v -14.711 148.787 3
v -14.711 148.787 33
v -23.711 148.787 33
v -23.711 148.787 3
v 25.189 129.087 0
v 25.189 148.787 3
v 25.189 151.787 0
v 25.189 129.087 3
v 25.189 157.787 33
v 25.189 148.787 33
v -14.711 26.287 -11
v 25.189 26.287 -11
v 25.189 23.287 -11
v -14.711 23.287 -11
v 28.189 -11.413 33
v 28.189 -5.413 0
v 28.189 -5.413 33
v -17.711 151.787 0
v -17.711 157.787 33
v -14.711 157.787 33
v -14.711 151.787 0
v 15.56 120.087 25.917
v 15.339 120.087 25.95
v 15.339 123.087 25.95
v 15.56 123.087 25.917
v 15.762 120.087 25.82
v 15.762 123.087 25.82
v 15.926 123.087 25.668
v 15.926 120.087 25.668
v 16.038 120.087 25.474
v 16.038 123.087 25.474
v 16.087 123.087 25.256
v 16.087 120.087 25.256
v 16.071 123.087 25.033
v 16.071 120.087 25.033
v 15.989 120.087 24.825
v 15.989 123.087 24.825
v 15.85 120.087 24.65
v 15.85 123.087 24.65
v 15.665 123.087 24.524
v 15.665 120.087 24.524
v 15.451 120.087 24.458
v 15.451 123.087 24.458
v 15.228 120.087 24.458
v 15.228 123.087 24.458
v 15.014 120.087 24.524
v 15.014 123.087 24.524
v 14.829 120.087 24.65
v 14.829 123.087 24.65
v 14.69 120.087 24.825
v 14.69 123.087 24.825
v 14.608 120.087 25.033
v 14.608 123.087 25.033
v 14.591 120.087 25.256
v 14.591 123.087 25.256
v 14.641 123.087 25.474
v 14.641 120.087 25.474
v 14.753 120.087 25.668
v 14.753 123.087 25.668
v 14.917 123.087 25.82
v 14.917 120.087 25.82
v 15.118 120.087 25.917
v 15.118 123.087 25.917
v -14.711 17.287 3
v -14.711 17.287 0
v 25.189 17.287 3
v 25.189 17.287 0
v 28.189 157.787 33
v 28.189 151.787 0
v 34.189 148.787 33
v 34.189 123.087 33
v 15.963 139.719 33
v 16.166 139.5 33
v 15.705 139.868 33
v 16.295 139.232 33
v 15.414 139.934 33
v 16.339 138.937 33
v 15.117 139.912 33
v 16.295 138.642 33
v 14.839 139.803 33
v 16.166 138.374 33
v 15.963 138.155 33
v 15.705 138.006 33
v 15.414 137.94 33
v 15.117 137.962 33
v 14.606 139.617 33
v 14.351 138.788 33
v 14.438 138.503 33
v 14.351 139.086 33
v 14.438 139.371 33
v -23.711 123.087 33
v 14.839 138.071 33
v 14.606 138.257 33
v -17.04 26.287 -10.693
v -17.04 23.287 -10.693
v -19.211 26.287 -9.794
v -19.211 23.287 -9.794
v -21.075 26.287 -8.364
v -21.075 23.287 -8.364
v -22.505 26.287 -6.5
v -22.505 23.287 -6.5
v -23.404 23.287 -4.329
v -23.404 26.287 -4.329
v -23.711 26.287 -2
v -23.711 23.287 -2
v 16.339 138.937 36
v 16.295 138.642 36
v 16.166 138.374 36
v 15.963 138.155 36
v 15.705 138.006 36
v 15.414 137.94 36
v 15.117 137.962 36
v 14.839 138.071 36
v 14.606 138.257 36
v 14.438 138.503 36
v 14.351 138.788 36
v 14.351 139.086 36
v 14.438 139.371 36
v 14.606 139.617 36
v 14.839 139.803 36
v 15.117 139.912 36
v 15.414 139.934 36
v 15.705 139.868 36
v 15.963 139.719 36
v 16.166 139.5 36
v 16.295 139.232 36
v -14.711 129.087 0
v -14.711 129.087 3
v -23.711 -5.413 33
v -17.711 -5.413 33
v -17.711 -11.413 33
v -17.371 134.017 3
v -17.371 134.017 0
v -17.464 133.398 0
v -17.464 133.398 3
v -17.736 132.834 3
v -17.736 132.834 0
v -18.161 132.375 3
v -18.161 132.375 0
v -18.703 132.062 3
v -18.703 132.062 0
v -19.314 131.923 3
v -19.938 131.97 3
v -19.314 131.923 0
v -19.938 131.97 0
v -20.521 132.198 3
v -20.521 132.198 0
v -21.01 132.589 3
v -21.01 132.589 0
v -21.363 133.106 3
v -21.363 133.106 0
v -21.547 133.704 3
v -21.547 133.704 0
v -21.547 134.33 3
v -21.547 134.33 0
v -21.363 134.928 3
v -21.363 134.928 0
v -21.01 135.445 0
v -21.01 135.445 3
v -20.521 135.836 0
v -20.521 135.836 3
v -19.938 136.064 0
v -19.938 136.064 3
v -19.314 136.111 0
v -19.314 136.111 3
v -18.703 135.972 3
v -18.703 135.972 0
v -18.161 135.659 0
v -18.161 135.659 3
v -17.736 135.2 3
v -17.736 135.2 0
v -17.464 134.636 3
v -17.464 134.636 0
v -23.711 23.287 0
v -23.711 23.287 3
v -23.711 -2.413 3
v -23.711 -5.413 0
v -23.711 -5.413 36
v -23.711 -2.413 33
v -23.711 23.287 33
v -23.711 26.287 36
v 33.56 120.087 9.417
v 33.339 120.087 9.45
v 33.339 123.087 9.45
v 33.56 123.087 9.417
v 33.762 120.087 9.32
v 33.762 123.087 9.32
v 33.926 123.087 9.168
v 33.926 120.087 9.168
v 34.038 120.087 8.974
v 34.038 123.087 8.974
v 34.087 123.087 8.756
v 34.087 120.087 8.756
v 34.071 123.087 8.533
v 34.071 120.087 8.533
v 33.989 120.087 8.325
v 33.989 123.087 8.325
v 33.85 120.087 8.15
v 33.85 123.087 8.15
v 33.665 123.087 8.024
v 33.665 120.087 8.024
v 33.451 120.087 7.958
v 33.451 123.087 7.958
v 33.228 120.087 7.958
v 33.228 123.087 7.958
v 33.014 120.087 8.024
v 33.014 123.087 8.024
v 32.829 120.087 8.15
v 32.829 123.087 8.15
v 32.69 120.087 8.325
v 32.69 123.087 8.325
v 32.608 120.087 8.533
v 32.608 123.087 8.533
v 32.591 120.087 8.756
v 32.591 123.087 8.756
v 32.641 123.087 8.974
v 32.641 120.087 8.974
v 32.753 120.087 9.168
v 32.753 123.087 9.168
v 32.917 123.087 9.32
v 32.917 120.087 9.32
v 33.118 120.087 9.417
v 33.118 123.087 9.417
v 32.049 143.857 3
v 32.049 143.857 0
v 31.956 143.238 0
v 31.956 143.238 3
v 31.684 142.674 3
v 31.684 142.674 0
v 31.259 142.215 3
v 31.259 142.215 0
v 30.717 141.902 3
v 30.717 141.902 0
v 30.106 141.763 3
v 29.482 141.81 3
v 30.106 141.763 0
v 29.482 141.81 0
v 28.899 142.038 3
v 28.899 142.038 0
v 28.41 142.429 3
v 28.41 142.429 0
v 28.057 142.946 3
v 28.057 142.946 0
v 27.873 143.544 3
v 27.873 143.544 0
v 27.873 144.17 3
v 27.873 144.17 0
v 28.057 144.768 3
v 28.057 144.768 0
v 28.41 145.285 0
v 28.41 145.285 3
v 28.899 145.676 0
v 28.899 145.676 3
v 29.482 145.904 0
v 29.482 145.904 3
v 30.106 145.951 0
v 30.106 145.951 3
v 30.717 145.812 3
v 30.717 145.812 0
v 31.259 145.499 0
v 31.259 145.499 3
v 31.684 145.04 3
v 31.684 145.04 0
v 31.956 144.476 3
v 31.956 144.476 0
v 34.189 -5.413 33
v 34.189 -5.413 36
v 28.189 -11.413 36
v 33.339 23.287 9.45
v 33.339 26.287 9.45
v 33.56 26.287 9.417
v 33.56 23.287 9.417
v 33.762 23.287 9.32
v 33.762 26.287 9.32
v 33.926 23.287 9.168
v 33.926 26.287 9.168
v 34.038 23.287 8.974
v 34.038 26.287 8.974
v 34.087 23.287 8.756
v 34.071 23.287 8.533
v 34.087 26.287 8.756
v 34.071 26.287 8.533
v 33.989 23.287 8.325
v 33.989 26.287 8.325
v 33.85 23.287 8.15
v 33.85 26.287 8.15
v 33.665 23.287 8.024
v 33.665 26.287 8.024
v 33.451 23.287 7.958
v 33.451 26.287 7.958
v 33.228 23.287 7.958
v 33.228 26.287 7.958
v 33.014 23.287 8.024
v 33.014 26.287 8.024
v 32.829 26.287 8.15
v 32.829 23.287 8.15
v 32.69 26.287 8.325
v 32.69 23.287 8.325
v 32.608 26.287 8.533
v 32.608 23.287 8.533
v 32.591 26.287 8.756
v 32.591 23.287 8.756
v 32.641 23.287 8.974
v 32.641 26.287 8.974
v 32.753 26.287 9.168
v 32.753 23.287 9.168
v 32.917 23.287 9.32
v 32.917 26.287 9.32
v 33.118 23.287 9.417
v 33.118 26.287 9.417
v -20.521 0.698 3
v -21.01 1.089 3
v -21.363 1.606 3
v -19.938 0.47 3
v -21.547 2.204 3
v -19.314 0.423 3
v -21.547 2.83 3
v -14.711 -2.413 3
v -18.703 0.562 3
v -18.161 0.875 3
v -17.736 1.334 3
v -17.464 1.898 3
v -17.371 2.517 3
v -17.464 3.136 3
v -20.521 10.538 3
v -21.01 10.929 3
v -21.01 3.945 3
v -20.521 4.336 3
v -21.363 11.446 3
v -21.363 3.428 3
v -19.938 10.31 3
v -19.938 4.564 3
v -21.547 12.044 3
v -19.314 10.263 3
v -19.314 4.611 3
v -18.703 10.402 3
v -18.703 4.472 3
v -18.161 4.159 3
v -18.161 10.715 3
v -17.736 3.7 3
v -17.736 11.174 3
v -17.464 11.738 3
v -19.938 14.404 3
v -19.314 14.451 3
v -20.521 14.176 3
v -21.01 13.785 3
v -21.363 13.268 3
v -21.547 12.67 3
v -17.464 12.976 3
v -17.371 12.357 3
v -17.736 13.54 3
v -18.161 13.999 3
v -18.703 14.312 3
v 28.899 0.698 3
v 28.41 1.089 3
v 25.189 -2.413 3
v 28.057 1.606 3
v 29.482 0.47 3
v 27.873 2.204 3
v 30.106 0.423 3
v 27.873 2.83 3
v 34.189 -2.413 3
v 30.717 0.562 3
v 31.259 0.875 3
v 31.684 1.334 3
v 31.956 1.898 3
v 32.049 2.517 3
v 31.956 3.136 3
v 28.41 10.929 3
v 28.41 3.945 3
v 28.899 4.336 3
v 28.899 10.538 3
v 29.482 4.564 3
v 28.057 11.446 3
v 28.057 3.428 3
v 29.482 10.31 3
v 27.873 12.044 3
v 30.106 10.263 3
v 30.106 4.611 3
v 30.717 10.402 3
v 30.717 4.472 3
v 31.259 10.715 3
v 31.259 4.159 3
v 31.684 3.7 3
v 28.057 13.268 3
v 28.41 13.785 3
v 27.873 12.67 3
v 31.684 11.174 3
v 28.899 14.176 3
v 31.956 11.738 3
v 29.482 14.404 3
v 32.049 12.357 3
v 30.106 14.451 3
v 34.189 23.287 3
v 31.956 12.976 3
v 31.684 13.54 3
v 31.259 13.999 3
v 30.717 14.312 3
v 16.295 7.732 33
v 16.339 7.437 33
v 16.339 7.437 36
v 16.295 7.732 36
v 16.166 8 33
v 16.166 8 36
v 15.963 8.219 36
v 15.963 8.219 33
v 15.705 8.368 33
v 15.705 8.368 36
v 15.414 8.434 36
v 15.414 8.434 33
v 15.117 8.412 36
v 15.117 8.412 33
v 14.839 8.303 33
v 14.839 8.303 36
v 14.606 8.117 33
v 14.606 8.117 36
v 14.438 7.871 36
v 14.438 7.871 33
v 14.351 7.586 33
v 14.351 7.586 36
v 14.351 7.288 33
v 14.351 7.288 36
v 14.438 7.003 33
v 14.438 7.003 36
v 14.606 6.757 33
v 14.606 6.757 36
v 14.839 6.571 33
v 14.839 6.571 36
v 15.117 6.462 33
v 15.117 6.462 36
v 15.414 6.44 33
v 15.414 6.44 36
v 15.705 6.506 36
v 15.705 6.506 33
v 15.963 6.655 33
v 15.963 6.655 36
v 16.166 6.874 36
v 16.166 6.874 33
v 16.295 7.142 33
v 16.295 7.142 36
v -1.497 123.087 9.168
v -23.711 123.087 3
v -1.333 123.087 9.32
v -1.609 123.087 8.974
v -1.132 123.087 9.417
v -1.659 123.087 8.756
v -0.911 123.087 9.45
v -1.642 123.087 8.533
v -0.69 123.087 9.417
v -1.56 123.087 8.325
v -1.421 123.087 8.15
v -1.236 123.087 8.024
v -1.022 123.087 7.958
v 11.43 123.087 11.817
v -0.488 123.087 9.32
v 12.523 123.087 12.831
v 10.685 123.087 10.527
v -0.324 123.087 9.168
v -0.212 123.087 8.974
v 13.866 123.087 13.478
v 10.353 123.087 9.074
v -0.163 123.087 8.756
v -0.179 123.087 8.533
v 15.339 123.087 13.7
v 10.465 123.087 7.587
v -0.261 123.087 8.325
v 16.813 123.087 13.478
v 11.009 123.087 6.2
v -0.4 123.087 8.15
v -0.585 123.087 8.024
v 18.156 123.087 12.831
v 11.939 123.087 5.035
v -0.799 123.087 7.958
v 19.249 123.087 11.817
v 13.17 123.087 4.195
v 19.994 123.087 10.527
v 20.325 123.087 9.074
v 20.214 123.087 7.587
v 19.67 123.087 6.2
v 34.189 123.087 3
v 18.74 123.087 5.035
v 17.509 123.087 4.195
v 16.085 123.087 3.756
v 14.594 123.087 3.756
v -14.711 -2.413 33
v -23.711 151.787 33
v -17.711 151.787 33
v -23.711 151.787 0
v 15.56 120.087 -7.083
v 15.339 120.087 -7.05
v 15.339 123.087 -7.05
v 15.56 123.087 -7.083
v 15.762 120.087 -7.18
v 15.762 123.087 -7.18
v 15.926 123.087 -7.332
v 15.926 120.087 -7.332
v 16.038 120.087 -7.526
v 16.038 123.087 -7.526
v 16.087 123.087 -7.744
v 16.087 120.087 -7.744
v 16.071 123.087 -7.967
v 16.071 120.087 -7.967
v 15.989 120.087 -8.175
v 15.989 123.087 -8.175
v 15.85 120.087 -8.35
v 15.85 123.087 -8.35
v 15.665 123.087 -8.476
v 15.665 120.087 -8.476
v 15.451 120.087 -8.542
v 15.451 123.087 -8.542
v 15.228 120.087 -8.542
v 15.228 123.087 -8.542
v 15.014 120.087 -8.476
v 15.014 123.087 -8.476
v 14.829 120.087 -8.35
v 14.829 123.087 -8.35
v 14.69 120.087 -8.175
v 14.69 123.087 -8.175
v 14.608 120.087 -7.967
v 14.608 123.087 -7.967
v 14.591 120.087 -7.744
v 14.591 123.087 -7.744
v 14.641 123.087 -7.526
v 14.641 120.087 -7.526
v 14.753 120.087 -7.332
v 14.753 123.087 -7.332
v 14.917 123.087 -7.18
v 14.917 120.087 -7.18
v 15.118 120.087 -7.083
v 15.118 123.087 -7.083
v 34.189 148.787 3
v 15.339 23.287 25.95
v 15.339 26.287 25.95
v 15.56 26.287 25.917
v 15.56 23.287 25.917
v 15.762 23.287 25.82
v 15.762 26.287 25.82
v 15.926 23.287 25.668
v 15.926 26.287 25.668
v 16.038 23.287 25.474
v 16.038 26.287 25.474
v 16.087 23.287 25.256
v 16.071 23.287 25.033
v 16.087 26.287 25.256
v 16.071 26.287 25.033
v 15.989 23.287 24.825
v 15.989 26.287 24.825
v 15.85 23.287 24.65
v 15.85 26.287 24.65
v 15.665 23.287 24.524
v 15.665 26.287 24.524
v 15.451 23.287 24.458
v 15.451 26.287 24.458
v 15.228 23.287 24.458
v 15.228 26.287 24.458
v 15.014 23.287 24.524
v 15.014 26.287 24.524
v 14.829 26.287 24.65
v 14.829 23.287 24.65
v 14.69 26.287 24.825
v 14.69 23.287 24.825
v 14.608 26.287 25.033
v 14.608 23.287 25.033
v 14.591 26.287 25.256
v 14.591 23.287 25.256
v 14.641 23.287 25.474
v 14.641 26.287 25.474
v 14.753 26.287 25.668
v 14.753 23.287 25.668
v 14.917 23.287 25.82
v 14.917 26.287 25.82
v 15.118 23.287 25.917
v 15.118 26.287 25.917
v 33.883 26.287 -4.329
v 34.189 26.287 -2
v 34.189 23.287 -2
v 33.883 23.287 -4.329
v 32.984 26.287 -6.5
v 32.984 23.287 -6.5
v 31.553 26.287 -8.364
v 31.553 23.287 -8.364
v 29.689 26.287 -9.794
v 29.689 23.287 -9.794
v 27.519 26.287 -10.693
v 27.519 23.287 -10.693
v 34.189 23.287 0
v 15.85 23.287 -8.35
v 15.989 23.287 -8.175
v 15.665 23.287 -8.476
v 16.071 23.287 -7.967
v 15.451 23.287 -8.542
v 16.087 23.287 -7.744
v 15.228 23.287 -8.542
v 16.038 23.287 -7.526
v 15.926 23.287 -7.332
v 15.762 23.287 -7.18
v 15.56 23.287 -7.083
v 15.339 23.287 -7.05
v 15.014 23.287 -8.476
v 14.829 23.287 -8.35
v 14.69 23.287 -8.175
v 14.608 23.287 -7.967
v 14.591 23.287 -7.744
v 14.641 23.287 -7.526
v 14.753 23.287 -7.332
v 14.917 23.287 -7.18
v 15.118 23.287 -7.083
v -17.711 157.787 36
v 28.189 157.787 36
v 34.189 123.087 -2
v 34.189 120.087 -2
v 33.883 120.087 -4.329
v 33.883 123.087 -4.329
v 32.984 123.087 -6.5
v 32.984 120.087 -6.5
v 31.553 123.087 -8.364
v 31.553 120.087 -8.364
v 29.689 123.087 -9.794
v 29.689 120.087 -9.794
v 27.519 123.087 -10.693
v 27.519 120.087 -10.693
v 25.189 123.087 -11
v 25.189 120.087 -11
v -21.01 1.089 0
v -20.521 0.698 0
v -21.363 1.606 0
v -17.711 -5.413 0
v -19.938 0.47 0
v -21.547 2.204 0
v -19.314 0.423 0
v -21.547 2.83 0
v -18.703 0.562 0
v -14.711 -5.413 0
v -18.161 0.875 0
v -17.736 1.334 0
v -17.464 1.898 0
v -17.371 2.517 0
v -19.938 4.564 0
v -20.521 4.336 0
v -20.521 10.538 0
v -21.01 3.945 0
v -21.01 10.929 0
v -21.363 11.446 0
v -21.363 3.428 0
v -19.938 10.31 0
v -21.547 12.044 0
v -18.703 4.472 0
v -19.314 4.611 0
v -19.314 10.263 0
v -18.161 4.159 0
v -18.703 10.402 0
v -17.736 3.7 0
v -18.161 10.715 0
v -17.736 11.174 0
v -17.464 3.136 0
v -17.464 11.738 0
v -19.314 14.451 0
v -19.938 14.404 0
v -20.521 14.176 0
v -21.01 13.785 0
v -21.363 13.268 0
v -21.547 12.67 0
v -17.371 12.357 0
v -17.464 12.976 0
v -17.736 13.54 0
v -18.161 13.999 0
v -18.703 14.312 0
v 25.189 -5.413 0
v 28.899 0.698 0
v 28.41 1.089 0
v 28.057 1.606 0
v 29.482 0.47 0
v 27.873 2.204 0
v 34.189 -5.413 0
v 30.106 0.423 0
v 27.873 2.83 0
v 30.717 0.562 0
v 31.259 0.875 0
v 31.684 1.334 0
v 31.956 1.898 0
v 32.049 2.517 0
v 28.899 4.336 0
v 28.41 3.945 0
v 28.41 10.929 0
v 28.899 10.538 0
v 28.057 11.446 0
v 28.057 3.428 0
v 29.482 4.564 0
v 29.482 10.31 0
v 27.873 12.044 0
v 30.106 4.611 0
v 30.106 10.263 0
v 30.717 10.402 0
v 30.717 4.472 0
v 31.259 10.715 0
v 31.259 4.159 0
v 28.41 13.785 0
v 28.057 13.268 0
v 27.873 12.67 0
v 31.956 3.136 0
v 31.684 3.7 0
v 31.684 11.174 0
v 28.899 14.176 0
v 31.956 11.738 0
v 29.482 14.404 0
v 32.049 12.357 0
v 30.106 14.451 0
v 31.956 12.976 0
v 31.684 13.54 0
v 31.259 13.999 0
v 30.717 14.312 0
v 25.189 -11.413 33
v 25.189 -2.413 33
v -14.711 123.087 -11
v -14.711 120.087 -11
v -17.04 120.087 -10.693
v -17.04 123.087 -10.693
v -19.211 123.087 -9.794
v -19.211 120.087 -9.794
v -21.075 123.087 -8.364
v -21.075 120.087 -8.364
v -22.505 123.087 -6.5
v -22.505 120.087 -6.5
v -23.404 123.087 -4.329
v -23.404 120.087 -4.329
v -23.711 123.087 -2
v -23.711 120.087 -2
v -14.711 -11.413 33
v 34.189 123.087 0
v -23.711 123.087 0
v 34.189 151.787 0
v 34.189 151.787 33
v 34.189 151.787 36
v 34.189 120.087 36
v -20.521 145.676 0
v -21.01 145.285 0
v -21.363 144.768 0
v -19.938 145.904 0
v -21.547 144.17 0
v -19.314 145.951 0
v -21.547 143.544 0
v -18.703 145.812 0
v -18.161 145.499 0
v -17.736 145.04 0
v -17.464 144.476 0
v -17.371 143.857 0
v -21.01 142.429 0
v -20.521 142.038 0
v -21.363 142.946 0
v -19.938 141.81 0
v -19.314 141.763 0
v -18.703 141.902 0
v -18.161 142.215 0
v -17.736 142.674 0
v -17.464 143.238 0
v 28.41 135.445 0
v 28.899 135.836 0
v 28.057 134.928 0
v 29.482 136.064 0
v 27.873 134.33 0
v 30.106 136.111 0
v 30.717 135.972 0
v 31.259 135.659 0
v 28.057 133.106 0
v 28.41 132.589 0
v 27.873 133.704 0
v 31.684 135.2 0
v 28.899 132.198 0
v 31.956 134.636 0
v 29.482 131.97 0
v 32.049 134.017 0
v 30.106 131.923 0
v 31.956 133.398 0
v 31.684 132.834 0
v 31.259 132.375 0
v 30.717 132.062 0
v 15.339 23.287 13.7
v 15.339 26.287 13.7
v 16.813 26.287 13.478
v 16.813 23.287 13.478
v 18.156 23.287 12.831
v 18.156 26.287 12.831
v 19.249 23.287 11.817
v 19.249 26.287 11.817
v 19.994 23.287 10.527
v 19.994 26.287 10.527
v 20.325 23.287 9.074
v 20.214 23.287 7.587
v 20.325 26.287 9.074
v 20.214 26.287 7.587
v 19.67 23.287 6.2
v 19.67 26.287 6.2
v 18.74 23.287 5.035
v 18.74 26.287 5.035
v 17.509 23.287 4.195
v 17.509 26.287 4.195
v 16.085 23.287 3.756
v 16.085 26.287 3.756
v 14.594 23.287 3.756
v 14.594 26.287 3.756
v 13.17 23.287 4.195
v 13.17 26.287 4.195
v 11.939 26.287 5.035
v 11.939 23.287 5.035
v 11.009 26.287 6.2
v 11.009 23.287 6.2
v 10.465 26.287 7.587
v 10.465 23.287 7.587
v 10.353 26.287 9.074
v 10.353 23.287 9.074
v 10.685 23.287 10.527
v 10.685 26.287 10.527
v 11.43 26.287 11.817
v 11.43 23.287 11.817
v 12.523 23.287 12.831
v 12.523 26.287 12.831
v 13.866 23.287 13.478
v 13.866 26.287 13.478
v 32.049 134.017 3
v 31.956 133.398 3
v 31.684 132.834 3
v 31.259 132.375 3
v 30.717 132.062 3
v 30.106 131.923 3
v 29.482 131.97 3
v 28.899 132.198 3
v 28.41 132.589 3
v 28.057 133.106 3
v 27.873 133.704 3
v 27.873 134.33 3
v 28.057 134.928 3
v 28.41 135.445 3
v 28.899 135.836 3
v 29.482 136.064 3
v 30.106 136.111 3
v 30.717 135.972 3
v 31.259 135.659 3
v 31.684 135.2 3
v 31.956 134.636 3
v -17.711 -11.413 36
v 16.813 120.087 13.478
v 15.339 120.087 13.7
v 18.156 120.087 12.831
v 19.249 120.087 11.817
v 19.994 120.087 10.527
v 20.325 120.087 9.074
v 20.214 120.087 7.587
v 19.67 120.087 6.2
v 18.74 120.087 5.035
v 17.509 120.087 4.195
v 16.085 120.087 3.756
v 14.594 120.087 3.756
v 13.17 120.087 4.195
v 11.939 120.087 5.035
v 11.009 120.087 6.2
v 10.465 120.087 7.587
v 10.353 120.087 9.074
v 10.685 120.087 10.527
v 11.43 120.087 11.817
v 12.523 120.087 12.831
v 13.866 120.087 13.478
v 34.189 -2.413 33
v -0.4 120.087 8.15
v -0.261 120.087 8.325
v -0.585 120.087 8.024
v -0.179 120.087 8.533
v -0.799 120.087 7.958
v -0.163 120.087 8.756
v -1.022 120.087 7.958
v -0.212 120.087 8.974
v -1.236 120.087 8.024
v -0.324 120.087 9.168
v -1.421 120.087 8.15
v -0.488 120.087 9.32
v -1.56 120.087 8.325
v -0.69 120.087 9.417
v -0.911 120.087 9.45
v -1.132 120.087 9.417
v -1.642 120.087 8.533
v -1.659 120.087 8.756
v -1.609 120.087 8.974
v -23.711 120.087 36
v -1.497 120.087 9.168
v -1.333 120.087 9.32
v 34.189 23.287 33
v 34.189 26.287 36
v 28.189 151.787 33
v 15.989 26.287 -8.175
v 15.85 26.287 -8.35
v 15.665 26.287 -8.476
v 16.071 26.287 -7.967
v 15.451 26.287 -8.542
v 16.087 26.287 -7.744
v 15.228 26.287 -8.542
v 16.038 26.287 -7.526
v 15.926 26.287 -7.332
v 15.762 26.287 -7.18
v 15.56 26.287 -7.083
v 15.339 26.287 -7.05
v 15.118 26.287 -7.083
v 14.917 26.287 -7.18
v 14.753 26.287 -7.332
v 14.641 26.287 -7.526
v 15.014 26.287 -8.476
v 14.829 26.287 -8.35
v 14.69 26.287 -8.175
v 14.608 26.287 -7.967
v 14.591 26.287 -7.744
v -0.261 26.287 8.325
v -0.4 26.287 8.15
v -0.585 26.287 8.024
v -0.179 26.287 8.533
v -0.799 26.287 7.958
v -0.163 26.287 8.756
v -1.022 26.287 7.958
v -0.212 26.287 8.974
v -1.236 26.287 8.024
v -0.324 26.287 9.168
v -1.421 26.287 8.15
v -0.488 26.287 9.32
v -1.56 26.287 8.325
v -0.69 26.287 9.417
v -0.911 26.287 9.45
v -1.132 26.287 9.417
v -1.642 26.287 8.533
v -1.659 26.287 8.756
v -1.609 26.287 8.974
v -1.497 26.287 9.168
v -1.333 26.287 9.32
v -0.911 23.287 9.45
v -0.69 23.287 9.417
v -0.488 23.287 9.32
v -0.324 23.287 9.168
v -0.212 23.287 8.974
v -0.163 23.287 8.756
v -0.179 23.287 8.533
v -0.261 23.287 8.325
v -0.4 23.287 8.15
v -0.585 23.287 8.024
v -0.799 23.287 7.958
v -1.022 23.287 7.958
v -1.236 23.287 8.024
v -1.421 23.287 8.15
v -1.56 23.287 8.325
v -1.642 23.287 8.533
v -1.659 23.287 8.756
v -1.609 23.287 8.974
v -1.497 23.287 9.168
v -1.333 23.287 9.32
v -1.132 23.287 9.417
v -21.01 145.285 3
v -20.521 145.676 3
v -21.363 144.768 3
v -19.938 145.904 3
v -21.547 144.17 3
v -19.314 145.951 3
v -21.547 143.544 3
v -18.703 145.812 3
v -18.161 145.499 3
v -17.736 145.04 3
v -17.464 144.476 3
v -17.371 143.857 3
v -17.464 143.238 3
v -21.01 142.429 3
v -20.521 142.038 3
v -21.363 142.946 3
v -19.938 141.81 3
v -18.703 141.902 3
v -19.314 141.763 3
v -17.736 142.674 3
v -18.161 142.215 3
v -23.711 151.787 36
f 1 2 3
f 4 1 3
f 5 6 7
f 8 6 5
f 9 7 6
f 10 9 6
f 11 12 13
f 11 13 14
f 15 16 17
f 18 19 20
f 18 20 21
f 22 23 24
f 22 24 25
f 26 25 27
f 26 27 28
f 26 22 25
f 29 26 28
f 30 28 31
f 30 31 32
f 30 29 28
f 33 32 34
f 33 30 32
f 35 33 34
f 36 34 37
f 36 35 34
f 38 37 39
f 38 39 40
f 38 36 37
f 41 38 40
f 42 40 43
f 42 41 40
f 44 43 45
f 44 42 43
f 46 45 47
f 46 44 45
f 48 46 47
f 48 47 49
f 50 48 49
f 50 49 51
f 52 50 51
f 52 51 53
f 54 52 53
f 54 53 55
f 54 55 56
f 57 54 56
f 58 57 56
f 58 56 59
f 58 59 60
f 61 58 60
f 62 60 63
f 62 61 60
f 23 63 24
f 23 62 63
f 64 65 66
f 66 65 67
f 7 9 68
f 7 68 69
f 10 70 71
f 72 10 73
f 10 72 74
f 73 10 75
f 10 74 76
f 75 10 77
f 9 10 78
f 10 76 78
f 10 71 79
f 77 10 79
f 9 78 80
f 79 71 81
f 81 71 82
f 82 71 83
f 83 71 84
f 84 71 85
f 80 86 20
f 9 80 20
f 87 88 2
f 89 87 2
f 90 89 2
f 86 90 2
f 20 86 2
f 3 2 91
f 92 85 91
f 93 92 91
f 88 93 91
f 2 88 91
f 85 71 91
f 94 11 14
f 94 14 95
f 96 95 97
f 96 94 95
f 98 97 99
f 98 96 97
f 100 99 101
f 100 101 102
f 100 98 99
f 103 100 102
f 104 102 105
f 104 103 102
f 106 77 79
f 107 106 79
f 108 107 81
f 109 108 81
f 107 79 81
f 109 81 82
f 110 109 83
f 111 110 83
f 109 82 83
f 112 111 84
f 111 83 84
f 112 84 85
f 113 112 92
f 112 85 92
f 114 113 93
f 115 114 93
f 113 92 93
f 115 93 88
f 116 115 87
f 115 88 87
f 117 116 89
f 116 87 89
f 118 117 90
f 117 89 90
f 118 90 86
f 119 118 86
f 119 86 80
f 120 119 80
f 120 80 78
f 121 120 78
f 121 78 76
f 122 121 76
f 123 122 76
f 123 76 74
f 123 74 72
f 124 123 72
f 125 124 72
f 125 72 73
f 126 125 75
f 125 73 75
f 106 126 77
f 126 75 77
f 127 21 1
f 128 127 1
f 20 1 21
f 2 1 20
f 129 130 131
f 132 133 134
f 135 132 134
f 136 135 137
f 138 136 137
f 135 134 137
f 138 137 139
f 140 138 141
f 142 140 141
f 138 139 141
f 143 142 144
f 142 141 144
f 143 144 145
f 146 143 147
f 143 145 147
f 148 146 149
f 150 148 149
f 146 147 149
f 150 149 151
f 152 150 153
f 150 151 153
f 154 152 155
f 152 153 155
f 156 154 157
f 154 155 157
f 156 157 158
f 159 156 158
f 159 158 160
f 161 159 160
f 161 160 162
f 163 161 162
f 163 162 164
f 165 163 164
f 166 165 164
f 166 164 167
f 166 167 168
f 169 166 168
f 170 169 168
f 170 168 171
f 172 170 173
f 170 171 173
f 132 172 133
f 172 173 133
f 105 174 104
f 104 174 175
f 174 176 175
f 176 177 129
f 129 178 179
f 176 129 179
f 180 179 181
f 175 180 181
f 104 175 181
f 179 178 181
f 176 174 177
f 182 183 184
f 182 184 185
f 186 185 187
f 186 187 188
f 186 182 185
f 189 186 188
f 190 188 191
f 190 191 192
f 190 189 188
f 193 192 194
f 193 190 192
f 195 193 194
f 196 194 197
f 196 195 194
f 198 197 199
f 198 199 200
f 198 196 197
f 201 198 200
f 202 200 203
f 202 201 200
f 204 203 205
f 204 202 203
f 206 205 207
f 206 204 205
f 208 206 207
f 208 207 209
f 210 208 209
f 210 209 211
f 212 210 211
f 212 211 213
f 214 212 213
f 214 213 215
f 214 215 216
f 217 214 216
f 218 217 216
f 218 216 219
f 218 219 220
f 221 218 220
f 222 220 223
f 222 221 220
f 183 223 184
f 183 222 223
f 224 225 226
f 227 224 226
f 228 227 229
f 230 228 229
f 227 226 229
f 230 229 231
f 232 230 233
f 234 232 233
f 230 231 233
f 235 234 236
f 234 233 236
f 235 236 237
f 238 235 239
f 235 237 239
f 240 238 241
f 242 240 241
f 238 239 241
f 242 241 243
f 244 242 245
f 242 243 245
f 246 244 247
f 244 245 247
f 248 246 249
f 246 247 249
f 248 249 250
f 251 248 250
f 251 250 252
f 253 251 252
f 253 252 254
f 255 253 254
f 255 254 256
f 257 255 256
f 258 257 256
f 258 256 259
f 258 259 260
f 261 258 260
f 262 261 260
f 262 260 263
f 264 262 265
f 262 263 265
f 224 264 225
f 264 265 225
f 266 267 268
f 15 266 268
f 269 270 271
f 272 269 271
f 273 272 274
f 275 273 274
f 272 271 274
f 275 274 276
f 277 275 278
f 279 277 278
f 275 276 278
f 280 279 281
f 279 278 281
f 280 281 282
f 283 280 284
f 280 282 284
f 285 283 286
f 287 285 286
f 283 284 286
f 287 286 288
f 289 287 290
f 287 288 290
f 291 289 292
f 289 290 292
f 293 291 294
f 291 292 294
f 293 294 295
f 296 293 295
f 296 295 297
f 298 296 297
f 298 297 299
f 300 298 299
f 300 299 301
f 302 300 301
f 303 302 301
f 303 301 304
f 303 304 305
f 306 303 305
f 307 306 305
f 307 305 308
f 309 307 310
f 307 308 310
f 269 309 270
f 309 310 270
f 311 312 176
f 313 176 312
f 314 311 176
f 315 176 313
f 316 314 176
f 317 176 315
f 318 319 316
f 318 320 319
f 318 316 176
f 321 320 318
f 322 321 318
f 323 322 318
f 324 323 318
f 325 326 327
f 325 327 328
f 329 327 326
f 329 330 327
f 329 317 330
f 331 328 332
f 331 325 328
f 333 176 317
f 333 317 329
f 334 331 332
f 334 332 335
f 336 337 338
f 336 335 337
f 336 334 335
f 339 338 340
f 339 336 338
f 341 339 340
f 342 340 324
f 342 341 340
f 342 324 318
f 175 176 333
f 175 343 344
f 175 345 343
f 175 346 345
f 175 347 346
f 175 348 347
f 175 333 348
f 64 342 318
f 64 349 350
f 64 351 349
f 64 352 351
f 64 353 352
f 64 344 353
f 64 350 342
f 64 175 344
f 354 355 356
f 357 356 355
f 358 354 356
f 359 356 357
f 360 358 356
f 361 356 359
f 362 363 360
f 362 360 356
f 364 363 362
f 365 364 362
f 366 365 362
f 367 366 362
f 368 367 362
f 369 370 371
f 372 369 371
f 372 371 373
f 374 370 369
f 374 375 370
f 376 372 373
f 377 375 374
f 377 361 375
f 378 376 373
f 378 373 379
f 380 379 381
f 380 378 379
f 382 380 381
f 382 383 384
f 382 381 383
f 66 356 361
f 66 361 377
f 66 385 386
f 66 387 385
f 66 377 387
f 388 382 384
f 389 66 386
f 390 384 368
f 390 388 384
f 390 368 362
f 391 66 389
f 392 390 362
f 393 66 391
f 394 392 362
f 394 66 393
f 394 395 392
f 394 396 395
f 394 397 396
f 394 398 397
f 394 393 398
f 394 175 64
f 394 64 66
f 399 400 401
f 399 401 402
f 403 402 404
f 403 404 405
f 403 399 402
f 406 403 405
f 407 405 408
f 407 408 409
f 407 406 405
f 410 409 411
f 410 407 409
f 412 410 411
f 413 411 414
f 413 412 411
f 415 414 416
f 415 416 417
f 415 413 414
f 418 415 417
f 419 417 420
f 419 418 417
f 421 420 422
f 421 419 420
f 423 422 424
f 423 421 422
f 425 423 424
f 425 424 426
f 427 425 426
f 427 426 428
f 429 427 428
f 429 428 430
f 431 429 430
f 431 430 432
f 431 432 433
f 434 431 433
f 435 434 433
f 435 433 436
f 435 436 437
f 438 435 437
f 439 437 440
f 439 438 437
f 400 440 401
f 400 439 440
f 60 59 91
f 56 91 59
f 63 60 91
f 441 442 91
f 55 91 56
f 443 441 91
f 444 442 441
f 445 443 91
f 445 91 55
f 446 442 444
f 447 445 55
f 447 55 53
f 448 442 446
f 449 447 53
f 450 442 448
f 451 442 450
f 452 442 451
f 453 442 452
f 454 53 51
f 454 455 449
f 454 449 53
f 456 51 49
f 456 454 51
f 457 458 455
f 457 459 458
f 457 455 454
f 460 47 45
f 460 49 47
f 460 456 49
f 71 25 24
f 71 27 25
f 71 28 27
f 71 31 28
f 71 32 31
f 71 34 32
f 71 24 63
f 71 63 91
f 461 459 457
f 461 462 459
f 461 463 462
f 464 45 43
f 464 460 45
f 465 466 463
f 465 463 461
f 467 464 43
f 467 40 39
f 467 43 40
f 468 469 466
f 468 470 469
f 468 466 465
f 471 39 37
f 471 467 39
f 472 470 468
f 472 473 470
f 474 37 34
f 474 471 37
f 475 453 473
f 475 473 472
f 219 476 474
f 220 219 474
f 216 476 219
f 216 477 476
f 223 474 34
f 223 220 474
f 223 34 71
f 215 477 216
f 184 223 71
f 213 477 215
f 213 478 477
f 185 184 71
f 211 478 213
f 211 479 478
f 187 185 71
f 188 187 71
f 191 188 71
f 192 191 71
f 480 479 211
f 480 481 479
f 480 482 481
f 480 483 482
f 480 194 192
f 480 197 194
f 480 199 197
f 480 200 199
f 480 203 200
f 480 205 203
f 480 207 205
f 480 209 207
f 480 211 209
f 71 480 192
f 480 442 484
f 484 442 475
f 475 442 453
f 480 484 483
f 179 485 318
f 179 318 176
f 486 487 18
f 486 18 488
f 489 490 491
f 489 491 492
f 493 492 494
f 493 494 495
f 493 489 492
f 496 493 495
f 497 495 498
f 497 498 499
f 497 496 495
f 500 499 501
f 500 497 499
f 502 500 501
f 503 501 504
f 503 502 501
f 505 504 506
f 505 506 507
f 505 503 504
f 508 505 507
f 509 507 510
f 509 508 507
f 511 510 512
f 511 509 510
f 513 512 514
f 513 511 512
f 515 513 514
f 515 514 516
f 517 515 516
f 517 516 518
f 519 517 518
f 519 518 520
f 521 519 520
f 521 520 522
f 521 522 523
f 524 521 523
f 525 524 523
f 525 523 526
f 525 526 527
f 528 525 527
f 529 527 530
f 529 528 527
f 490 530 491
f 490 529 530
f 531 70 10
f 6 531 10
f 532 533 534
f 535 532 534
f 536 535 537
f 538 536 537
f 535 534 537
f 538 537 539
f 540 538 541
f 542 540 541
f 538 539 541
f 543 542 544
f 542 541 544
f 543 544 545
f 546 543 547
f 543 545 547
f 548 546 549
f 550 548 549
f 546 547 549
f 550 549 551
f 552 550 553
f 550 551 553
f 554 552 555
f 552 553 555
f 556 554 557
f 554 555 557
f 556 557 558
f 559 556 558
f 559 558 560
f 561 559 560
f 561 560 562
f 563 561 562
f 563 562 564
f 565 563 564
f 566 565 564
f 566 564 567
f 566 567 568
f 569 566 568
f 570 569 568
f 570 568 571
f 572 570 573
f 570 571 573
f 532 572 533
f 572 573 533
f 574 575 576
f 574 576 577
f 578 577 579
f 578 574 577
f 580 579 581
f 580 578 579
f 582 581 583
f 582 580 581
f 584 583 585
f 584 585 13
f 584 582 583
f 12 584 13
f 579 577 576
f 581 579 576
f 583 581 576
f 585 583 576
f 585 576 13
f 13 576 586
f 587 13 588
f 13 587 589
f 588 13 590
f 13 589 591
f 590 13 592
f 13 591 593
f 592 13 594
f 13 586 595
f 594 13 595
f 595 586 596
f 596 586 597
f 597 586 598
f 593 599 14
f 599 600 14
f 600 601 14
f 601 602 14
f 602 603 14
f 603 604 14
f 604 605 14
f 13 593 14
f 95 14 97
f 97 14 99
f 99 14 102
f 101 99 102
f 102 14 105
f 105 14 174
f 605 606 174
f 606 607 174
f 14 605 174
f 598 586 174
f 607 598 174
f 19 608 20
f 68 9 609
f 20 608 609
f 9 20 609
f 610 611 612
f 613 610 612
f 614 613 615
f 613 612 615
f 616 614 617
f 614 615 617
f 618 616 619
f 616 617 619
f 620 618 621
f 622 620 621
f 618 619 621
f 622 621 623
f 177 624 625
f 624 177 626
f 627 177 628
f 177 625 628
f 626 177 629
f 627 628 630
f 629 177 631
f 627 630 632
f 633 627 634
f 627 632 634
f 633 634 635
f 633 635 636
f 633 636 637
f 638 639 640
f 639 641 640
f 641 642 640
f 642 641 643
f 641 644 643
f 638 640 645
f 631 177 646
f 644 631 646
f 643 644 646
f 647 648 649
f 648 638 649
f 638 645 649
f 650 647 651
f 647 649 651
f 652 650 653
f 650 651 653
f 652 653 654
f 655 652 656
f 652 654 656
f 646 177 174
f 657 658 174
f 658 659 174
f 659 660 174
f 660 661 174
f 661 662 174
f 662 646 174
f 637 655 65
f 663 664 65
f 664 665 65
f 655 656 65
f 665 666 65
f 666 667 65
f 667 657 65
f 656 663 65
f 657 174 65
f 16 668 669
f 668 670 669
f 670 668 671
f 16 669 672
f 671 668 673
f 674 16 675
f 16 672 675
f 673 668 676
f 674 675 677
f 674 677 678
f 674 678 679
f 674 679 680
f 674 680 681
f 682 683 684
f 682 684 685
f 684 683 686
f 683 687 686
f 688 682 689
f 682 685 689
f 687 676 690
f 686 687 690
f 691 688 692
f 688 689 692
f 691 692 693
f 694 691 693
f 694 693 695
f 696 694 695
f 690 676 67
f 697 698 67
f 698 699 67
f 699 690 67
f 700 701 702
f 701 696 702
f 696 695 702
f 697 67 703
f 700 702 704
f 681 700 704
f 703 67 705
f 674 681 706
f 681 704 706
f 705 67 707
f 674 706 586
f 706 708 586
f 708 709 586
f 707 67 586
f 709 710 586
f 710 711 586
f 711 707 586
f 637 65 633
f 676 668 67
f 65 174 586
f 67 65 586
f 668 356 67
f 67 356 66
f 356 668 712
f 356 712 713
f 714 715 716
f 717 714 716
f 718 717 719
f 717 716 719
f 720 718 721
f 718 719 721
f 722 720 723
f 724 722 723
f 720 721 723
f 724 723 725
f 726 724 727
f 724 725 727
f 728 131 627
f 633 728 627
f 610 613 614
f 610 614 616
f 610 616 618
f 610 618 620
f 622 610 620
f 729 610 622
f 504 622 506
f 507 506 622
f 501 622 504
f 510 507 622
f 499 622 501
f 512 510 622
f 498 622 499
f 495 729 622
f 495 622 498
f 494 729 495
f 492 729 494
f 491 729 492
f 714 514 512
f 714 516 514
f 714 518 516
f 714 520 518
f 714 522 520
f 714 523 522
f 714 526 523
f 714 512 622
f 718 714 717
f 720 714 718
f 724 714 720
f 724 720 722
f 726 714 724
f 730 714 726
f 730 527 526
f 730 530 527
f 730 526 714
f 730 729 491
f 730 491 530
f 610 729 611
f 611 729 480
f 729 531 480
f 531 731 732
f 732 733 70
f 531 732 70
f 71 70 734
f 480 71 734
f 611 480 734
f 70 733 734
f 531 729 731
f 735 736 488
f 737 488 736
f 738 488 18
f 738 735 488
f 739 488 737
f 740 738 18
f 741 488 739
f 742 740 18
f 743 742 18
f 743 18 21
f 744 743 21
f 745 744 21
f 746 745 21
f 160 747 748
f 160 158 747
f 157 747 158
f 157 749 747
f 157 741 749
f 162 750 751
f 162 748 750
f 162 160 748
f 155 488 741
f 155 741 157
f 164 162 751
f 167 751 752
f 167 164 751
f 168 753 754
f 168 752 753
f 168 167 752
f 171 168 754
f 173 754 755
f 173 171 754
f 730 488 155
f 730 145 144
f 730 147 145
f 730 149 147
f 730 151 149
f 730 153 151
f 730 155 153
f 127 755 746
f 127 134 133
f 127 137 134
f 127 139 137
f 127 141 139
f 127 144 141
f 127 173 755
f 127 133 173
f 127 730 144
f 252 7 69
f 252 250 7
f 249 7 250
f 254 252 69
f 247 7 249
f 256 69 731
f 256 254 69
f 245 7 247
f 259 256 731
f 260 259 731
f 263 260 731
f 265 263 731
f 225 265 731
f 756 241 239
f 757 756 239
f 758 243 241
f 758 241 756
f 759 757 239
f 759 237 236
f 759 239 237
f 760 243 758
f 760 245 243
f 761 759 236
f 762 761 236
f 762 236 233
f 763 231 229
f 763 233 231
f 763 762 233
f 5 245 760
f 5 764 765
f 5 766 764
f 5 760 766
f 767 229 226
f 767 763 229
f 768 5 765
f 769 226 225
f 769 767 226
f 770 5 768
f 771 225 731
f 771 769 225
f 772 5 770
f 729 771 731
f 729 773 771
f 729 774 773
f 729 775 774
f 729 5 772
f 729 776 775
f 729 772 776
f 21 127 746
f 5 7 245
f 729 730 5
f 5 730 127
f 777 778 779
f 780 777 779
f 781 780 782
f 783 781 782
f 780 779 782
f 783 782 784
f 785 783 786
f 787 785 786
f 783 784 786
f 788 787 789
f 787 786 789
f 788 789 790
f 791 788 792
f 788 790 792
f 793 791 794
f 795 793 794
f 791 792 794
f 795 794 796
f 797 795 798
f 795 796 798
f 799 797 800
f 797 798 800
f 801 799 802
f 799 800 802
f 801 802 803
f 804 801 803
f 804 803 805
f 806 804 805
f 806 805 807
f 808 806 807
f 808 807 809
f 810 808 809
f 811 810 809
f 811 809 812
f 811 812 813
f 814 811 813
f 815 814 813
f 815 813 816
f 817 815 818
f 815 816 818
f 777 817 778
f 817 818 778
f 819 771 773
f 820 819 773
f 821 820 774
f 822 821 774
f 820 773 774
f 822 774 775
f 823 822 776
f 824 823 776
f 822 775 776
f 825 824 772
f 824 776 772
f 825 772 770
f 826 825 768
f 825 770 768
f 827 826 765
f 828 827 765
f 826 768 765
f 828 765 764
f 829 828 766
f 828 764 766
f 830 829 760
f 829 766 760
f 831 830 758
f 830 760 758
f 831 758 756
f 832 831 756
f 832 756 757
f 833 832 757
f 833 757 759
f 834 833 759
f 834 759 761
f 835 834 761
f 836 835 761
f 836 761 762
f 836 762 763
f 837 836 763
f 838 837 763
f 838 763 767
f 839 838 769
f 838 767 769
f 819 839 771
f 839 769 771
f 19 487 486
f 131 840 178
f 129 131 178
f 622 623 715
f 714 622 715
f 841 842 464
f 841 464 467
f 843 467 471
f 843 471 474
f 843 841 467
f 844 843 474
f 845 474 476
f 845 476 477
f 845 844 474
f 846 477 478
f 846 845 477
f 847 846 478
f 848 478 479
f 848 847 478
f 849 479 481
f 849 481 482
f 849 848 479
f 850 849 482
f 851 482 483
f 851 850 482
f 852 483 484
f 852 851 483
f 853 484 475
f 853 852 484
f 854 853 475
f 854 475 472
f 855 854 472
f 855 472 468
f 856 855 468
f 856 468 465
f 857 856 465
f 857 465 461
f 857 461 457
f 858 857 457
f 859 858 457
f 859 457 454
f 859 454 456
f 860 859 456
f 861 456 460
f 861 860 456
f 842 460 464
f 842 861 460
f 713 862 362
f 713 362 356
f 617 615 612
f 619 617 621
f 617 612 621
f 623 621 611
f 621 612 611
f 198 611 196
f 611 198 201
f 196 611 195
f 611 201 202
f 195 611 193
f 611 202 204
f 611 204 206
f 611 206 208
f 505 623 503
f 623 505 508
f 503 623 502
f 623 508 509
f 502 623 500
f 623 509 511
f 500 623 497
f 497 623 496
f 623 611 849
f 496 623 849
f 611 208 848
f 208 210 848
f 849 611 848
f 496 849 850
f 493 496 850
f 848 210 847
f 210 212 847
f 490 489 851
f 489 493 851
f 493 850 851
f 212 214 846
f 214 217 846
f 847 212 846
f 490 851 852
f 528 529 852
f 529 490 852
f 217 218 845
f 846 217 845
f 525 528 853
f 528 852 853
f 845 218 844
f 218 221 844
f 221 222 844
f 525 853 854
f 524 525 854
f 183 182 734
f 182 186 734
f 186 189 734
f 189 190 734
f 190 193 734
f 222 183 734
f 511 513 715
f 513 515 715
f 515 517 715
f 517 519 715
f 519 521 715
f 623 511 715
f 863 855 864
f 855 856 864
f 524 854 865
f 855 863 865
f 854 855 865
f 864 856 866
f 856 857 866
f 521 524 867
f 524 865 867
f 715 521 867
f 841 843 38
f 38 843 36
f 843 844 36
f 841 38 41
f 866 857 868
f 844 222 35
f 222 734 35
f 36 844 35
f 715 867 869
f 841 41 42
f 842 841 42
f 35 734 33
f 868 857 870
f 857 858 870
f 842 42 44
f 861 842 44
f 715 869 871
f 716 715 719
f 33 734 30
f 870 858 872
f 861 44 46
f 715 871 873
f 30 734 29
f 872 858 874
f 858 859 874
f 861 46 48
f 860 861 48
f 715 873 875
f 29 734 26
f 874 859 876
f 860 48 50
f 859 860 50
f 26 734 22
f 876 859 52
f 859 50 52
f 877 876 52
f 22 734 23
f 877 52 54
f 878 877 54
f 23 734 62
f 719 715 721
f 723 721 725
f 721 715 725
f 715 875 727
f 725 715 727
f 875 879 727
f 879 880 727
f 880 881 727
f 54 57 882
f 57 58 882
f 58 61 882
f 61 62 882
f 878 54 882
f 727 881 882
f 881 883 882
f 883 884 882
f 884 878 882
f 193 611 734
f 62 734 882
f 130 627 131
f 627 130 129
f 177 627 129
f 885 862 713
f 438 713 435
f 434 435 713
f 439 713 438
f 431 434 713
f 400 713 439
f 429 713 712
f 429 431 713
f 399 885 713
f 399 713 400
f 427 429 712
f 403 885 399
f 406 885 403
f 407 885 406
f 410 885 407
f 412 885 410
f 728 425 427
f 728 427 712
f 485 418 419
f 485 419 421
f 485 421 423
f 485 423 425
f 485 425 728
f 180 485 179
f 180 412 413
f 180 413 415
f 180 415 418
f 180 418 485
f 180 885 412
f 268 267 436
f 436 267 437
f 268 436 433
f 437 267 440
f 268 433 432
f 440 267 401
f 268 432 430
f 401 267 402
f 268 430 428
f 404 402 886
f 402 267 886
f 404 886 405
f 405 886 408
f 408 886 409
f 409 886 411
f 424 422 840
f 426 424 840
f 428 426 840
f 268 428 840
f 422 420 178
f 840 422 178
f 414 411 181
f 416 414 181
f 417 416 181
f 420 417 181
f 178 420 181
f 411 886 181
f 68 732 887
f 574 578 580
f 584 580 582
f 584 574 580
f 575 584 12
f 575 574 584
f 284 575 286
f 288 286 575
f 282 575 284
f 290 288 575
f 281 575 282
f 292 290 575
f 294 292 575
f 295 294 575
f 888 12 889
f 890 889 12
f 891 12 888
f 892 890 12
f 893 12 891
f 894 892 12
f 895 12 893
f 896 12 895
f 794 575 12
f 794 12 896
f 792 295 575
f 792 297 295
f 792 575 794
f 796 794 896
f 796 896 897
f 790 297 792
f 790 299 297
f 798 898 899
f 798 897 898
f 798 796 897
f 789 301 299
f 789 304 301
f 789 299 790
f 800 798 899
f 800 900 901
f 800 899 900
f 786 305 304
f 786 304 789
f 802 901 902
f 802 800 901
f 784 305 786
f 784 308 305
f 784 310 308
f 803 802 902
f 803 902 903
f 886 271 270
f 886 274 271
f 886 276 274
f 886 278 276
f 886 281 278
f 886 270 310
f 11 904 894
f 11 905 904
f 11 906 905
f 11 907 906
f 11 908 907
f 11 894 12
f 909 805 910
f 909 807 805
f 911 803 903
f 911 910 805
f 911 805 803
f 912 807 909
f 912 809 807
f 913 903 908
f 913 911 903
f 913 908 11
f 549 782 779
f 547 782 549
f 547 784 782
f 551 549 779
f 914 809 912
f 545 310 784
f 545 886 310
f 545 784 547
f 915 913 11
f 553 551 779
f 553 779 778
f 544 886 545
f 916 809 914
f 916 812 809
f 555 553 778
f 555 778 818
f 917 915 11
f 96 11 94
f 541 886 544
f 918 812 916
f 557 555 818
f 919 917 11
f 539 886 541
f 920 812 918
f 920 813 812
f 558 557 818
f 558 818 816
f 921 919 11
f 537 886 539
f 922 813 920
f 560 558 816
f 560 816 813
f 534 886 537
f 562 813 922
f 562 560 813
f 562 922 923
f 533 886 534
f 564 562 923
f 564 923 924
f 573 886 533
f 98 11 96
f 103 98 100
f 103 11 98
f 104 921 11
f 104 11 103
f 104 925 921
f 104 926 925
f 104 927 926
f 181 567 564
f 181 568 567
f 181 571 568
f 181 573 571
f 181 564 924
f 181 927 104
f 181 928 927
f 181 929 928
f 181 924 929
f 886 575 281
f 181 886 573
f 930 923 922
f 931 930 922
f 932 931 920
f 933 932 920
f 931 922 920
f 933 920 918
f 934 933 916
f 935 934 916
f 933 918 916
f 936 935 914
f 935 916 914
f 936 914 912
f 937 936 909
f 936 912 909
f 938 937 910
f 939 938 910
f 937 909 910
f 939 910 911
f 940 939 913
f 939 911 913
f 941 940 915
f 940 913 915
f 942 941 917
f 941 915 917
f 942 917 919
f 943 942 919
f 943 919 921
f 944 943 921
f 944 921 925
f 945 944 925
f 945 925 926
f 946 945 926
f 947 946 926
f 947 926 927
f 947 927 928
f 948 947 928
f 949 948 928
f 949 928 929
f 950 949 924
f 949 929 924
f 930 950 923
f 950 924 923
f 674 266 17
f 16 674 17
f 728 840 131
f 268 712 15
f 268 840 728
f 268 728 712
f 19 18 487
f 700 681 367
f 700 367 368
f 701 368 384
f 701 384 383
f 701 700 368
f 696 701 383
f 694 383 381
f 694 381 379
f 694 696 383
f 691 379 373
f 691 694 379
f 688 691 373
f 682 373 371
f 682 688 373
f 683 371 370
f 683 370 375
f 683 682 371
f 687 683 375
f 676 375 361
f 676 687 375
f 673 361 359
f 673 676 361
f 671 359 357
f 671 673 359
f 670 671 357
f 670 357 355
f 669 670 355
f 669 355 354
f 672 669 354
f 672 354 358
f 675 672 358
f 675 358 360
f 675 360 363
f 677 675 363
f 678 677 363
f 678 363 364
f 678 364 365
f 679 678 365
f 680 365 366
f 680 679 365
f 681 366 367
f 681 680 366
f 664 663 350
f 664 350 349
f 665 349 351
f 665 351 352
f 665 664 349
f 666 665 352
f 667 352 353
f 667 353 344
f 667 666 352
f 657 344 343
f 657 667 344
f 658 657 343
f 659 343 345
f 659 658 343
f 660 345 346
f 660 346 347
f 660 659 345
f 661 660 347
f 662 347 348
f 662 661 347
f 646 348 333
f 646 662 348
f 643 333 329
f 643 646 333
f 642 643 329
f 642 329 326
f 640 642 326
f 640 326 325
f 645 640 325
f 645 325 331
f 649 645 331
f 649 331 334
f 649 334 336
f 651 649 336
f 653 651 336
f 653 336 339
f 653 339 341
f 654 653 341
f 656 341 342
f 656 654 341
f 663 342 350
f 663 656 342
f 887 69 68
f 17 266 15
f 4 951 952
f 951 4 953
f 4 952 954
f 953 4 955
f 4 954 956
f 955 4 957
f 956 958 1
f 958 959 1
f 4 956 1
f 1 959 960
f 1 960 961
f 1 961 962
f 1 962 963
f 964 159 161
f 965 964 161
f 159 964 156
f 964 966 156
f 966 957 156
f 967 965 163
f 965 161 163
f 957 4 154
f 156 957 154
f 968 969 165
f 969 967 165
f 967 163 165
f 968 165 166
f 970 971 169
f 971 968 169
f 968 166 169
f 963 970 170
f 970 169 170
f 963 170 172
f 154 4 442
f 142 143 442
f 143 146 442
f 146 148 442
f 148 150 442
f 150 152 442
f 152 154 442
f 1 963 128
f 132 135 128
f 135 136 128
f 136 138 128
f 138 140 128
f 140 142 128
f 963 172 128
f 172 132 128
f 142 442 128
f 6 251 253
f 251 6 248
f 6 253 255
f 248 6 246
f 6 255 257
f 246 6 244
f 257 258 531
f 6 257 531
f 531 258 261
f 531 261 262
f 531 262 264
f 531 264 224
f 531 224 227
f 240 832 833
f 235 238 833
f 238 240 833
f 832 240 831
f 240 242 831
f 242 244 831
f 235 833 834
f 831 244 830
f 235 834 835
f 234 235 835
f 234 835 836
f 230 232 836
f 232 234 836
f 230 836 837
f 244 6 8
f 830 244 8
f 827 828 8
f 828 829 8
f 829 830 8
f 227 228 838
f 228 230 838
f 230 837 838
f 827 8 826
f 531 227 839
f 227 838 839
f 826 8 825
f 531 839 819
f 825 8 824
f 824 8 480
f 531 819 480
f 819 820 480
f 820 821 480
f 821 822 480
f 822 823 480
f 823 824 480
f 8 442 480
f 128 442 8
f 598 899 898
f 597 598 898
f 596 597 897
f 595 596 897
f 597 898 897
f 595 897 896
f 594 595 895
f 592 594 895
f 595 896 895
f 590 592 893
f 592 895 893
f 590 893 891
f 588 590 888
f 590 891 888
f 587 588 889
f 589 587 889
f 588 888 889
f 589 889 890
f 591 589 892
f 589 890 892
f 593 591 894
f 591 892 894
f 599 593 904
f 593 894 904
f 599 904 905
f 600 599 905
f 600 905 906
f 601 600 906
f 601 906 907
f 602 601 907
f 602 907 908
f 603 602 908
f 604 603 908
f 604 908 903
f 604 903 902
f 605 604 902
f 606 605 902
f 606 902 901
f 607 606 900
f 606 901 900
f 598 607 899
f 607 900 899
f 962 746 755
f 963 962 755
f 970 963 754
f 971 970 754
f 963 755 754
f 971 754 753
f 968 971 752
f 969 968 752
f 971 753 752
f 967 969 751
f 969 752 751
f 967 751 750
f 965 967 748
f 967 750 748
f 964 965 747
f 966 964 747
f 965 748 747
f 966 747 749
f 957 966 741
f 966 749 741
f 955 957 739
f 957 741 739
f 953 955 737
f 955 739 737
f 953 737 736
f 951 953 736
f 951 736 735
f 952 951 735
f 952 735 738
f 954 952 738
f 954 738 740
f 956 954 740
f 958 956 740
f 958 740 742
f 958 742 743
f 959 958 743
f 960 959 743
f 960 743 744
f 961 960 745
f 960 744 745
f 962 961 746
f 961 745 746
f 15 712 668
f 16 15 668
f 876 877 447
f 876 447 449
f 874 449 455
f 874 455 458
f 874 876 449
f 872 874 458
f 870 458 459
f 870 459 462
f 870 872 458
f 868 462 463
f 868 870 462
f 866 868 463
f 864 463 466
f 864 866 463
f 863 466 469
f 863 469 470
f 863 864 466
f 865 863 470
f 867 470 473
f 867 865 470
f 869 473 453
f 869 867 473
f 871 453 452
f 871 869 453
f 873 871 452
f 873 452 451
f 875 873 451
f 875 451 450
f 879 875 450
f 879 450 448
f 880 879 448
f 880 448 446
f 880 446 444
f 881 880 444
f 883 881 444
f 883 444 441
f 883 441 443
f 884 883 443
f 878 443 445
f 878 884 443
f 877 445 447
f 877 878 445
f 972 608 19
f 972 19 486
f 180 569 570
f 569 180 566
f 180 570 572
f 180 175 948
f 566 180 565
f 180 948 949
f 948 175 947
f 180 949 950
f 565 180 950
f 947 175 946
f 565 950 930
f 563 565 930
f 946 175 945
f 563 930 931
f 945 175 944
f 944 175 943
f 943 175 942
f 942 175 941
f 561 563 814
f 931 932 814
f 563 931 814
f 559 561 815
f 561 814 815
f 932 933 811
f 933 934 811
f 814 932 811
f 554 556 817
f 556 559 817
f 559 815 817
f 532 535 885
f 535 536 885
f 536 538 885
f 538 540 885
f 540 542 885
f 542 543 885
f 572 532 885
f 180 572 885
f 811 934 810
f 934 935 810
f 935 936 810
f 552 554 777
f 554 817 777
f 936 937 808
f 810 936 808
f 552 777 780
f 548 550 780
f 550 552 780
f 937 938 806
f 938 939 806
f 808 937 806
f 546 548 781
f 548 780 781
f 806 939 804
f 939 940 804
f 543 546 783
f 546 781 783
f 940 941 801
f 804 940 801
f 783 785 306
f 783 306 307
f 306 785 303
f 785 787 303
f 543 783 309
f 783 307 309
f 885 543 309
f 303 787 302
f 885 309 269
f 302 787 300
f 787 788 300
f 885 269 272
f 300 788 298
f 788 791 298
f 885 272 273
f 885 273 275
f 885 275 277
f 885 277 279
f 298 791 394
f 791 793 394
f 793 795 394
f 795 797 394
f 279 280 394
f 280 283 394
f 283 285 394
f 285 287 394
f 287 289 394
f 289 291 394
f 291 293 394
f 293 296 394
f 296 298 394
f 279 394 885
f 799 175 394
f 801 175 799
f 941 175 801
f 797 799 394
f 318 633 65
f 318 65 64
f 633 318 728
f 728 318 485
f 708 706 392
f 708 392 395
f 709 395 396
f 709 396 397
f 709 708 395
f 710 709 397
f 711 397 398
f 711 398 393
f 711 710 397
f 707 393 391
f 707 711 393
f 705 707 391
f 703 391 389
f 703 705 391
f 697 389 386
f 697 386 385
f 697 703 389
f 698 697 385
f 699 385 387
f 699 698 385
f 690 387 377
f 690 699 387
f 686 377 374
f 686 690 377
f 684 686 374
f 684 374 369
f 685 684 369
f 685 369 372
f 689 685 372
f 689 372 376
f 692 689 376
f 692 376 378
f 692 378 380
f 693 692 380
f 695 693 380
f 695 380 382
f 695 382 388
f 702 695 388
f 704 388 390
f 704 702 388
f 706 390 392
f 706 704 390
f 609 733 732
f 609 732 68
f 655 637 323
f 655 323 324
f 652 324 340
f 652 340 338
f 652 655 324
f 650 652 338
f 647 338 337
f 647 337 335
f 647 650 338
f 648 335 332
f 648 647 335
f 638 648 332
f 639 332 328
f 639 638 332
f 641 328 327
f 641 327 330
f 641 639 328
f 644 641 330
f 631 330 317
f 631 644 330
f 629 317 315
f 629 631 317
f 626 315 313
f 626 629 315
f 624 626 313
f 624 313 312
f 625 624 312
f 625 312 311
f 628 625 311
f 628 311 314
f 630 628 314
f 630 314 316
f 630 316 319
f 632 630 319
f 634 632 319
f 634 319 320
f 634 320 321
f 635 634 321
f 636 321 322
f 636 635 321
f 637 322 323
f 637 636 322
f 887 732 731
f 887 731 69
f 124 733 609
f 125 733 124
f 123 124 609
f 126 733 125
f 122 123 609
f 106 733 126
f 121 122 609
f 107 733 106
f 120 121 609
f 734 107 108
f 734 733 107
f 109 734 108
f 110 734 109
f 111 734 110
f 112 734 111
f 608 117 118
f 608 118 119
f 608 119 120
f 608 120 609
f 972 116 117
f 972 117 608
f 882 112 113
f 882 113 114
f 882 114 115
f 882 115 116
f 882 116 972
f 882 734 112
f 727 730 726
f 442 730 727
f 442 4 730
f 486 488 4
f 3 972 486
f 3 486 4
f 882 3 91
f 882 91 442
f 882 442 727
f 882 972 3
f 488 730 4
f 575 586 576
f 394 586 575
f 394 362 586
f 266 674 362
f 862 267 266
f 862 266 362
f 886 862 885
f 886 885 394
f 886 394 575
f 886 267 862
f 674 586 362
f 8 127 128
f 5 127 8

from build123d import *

# Parameters (mm, degrees)
SKETCH_1_W          = 57.9
SKETCH_1_H          = 37.7
SKETCH_1_R          = 2.1
SKETCH_1_W_2        = 39.9
SKETCH_1_H_2        = 19.7
EXTRUDE_1_DEPTH     = 3
SKETCH_2_W          = 57.9
SKETCH_2_H          = 3
EXTRUDE_2_DEPTH     = 30
SKETCH_3_R          = 1
EXTRUDE_3_DEPTH     = 3
SKETCH_9_W          = 57.9
SKETCH_9_H          = 3
EXTRUDE_4_DEPTH     = 11
SKETCH_10_R         = 0.75
SKETCH_10_R_2       = 5
CUT_EXTRUDE_3_DEPTH = 3
SKETCH_11_W         = 9
SKETCH_11_H         = 3
EXTRUDE_5_DEPTH     = 32
CUT_EXTRUDE_4_DEPTH = 9
EXTRUDE_6_DEPTH     = 3
SKETCH_17_W         = 3
SKETCH_17_H         = 33
EXTRUDE_7_DEPTH     = 6
CUT_EXTRUDE_5_DEPTH = 52


with BuildPart() as part:
    # 草图1 → 凸台-拉伸1 (new body)
    with BuildSketch(Plane.XY):
        with Locations((5.239385195, 7.436956636)):
            Rectangle(SKETCH_1_W, SKETCH_1_H)
        with Locations((-19.470614805, 12.356956636)):
            Circle(SKETCH_1_R, mode=Mode.SUBTRACT)
        with Locations((-19.470614805, 2.516956636)):
            Circle(SKETCH_1_R, mode=Mode.SUBTRACT)
        with Locations((29.949385195, 12.356956636)):
            Circle(SKETCH_1_R, mode=Mode.SUBTRACT)
        with Locations((29.949385195, 2.516956636)):
            Circle(SKETCH_1_R, mode=Mode.SUBTRACT)
        with Locations((5.239385195, 7.436956636)):
            Rectangle(SKETCH_1_W_2, SKETCH_1_H_2, mode=Mode.SUBTRACT)
    extrude(amount=EXTRUDE_1_DEPTH)

    # 草图2 → 凸台-拉伸2 (add)
    with BuildSketch(Plane.XY.offset(3)):
        with Locations((5.239385195, 24.786956636)):
            Rectangle(SKETCH_2_W, SKETCH_2_H)
    extrude(amount=EXTRUDE_2_DEPTH)

    # 草图3 → 凸台-拉伸3 (add)
    with BuildSketch(Plane.XY.offset(33)):
        Polygon((-14.710614805, 26.286956636), (-23.710614805, 26.286956636), (-23.710614805, -2.413043364), (-23.710614805, -5.413043364), (34.189385195, -5.413043364), (34.189385195, -2.413043364), (34.189385195, 26.286956636), (25.189385195, 26.286956636), align=None)
        with Locations((15.339385195, 7.436956636)):
            Circle(SKETCH_3_R, mode=Mode.SUBTRACT)
    extrude(amount=EXTRUDE_3_DEPTH)

    # 草图9 → 凸台-拉伸4 (add)
    with BuildSketch(Plane(origin=(0, 0, 0), x_dir=(-1, 0, 0), z_dir=(0, 0, -1))):
        with Locations((-5.239385195, 24.786956636)):
            Rectangle(SKETCH_9_W, SKETCH_9_H)
    extrude(amount=EXTRUDE_4_DEPTH)

    # 草图10 → 切除-拉伸3 (cut)
    with BuildSketch(Plane(origin=(0, 26.286956636, 0), x_dir=(1, 0, 0), z_dir=(0, 1, 0))):
        with Locations(Location((15.339385195, 7.8, 0), (0, 0, 270))):
            Circle(SKETCH_10_R)
        with Locations(Location((33.339385195, -8.7, 0), (0, 0, 270))):
            Circle(SKETCH_10_R)
        with Locations(Location((15.339385195, -25.2, 0), (0, 0, 270))):
            Circle(SKETCH_10_R)
        with Locations(Location((-0.910614805, -8.7, 0), (0, 0, 270))):
            Circle(SKETCH_10_R)
        with Locations(Location((15.339385195, -8.7, 0), (0, 0, 270))):
            Circle(SKETCH_10_R_2)
        with BuildLine():
            Line((-23.710614805, 2), (-23.710614805, 11))
            Line((-23.710614805, 11), (-14.710614805, 11))
            ThreePointArc((-14.710614805, 11), (-21.074575836, 8.363961031), (-23.710614805, 2))
        make_face()
        with BuildLine():
            Line((25.189385195, 11), (34.189385195, 11))
            Line((34.189385195, 11), (34.189385195, 2))
            ThreePointArc((34.189385195, 2), (31.553346226, 8.363961031), (25.189385195, 11))
        make_face()
    extrude(amount=-CUT_EXTRUDE_3_DEPTH, mode=Mode.SUBTRACT)


with BuildPart() as body_2:
    # 镜向1: mirrored copy
    add(part.part.mirror(Plane.ZX.offset(73.186956636)))


with BuildPart() as part_1:
    add(part.part)

    # 草图11 → 凸台-拉伸5 (add)
    with BuildSketch(Plane(origin=(0, 0, 33), x_dir=(-1, 0, 0), z_dir=(0, 0, -1))):
        with Locations((19.210614805, -3.913043364)):
            Rectangle(SKETCH_11_W, SKETCH_11_H)
        with Locations((-29.689385195, -3.913043364)):
            Rectangle(SKETCH_11_W, SKETCH_11_H)
    extrude(amount=EXTRUDE_5_DEPTH)

    # 草图12 → 切除-拉伸4 (cut)
    with BuildSketch(Plane(origin=(0, 0, 0), x_dir=(-1, 0, 0), z_dir=(0, 0, -1))):
        Polygon((-25.189385195, -2.413043364), (-25.189385195, -5.413043364), (-34.189385195, -5.413043364), (-34.189385195, -11.413043364), (23.710614805, -11.413043364), (23.710614805, -5.413043364), (14.710614805, -5.413043364), (14.710614805, -2.413043364), align=None)
    extrude(amount=-CUT_EXTRUDE_4_DEPTH, mode=Mode.SUBTRACT)

    # 草图13 → 凸台-拉伸6 (add)
    with BuildSketch(Plane.XY.offset(36)):
        Polygon((-23.710614805, -5.413043364), (34.189385195, -5.413043364), (28.189385195, -11.413043364), (-17.710614805, -11.413043364), align=None)
    extrude(amount=-EXTRUDE_6_DEPTH)

    # 草图17 → 凸台-拉伸7 (add)
    with BuildSketch(Plane.XZ.offset(5.413043364)):
        with Locations((-16.210614805, 16.5)):
            Rectangle(SKETCH_17_W, SKETCH_17_H)
        with Locations((26.689385195, 16.5)):
            Rectangle(SKETCH_17_W, SKETCH_17_H)
    extrude(amount=EXTRUDE_7_DEPTH)

    # 草图19 → 切除-拉伸5 (cut)
    with BuildSketch(Plane.ZY.offset(17.710614805)):
        Polygon((0, -5.413043364), (0, -11.413043364), (33, -11.413043364), align=None)
    extrude(amount=-CUT_EXTRUDE_5_DEPTH, mode=Mode.SUBTRACT)


with BuildPart() as body_2_2:
    # 镜向2: mirrored copy
    add(part_1.part.mirror(Plane.ZX.offset(73.186956636)))


solid = Compound([part_1.part, body_2_2.part])
